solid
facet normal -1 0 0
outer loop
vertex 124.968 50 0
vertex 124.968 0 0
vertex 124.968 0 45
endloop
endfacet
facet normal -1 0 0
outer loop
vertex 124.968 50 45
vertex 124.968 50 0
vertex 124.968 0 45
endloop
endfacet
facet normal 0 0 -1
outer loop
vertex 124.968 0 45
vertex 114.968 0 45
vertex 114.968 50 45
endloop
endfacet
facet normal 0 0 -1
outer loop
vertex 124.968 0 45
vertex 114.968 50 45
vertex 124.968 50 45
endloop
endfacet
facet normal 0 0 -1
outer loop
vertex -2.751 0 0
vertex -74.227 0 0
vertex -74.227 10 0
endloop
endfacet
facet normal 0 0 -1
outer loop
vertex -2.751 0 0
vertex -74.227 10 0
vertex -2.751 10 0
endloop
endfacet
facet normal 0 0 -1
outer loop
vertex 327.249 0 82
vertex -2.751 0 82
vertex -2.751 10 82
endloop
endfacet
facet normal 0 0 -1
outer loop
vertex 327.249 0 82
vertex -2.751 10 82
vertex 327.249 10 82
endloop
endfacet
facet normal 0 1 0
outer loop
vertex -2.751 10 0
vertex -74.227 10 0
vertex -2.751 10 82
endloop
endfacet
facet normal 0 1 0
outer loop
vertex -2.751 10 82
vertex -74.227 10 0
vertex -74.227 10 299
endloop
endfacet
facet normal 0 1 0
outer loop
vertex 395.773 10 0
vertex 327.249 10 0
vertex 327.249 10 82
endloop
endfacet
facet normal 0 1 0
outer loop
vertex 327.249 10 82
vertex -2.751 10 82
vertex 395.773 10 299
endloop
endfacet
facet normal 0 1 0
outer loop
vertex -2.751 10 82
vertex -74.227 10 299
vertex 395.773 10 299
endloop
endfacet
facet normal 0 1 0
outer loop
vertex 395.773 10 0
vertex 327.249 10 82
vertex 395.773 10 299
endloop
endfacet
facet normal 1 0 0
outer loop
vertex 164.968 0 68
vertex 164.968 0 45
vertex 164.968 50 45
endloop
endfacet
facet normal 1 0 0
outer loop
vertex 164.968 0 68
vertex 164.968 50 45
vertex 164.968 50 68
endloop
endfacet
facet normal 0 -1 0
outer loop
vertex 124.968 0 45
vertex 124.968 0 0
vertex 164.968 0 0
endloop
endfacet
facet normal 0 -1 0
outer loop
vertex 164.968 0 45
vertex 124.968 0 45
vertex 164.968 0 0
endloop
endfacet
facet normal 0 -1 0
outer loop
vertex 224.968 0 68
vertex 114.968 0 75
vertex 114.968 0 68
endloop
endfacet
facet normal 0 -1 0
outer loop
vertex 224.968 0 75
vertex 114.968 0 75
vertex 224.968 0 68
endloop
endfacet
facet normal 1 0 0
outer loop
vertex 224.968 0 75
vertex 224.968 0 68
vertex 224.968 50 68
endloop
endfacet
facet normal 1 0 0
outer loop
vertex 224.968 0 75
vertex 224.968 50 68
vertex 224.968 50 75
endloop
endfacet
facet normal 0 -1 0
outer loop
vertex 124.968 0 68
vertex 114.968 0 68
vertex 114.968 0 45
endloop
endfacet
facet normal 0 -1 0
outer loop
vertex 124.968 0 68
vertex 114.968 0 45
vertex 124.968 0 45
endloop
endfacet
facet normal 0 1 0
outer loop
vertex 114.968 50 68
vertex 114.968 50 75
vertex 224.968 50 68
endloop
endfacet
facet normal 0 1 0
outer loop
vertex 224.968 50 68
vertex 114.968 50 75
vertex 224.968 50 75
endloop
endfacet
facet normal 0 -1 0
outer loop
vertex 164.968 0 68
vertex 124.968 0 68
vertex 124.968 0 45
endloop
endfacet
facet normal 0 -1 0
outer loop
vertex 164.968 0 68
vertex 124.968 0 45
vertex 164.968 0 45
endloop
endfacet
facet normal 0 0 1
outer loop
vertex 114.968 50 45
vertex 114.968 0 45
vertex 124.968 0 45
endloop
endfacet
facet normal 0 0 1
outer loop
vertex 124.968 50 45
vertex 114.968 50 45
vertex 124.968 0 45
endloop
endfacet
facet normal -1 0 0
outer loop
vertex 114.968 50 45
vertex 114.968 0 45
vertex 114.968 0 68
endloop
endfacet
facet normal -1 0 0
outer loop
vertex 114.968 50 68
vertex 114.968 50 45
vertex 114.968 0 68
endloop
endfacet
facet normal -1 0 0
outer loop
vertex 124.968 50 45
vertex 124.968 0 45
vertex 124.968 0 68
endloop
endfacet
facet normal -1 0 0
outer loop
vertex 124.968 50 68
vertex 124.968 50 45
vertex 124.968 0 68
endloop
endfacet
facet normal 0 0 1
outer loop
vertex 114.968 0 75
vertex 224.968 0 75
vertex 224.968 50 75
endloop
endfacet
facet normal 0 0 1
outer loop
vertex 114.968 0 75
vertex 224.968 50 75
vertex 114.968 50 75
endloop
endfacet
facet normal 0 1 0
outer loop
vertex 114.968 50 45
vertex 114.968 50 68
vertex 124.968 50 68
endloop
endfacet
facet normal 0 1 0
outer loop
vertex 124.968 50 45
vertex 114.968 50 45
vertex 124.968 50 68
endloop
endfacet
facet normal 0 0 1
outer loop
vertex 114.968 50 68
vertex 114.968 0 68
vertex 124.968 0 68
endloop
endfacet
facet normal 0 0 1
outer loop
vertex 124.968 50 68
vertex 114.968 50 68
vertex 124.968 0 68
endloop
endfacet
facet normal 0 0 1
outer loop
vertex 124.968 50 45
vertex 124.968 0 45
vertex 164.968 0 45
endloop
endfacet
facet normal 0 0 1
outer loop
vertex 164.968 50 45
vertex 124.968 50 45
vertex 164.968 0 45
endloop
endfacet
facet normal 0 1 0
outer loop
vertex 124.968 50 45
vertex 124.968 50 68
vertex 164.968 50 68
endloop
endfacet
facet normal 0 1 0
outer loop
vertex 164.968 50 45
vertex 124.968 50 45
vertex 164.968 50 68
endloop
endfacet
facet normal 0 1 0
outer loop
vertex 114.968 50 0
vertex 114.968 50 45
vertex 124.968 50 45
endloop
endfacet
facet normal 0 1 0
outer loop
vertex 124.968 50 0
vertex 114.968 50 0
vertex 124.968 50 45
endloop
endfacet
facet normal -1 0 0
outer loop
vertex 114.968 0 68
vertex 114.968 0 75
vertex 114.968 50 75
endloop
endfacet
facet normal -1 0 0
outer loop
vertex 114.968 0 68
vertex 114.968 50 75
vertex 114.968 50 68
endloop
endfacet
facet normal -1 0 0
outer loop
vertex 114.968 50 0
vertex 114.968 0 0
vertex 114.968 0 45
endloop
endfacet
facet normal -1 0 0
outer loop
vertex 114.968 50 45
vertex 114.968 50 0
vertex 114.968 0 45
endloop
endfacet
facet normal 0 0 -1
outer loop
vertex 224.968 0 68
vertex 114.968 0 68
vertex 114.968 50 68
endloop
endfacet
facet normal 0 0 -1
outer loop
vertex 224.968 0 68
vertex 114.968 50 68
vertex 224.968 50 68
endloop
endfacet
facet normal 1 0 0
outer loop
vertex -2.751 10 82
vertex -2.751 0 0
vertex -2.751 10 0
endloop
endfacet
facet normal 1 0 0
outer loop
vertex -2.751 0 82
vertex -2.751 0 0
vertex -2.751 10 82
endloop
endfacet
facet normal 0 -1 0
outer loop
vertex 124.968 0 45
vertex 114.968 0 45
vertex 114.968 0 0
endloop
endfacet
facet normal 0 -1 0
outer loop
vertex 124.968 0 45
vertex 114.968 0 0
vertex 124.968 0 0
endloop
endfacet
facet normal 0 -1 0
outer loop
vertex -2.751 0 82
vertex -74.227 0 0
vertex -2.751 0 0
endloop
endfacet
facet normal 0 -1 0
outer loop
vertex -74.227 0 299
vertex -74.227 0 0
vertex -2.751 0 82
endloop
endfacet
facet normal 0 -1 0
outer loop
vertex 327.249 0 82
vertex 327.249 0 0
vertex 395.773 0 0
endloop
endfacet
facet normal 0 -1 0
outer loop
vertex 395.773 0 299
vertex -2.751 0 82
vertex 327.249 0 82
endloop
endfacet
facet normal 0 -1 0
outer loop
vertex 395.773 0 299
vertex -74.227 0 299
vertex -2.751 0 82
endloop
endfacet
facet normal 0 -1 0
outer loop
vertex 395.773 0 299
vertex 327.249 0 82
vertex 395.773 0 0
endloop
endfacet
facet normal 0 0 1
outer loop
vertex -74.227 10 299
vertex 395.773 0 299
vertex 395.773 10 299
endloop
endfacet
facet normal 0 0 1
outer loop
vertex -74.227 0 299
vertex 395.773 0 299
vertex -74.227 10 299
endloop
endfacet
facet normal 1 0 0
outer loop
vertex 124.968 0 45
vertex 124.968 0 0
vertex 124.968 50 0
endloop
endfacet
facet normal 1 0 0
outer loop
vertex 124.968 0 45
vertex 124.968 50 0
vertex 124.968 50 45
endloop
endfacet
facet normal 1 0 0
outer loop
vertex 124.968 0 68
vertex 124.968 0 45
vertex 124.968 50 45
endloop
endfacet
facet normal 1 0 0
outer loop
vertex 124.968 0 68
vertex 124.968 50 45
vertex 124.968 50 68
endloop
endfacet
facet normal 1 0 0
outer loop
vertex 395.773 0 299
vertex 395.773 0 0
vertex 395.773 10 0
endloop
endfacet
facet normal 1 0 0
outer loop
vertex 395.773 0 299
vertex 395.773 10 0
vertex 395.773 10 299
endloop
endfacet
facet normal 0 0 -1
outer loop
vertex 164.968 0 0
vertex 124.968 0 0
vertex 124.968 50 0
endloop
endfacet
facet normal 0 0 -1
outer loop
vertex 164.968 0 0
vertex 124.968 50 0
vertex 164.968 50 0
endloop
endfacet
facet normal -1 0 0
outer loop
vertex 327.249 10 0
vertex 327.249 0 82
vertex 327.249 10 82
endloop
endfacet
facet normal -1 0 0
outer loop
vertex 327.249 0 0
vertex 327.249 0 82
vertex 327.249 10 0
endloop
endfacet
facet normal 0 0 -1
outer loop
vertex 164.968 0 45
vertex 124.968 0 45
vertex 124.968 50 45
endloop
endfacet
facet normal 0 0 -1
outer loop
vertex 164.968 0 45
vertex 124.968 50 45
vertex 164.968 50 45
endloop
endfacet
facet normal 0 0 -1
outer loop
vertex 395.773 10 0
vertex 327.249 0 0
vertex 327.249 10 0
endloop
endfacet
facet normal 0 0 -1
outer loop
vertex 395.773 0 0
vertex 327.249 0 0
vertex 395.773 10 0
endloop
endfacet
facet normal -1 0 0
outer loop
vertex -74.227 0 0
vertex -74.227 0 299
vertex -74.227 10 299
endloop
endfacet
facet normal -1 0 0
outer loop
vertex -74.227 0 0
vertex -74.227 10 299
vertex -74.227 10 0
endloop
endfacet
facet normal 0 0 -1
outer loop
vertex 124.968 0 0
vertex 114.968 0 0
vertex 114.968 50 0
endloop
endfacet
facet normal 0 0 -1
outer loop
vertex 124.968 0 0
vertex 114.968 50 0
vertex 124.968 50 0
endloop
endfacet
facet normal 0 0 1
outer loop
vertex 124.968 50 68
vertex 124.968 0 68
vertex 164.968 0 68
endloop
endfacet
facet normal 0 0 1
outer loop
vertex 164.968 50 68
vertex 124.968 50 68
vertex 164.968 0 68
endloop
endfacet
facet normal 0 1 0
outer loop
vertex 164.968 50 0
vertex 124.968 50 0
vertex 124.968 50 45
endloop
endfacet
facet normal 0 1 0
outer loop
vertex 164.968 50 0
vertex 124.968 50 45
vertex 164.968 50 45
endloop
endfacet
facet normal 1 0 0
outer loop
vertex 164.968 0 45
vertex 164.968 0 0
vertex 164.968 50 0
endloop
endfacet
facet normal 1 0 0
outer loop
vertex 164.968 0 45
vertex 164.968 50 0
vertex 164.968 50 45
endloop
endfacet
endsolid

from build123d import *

# Parameters (mm, degrees)
F2_DEPTH = 10
F0_W     = 40
F0_H     = 45
F3_DEPTH = 50
F4_DEPTH = 50
F0_W_2   = 10
F5_DEPTH = 50
F0_H_2   = 23
F6_DEPTH = 50
F7_DEPTH = 50


with BuildPart() as f2:
    # F0 (on Front) → F2 (new body)
    with BuildSketch(Plane.XZ):
        Polygon((-74.2268053811, 299), (-74.2268053811, 0), (-2.7509614592, 0), (-2.7509614592, 82), (327.2490385408, 82), (327.2490385408, 0), (395.7731946189, 0), (395.7731946189, 299), align=None)
    extrude(amount=-F2_DEPTH)


with BuildPart() as f3:
    # F0 (on Front) → F3 (new body)
    with BuildSketch(Plane.XZ):
        with Locations((144.9680732191, 22.5)):
            Rectangle(F0_W, F0_H)
    extrude(amount=-F3_DEPTH)


with BuildPart() as f4:
    # F0 (on Front) → F4 (new body)
    with BuildSketch(Plane.XZ):
        Polygon((114.9680732191, 75), (114.9680732191, 68), (124.9680732191, 68), (164.9680732191, 68), (224.9680732191, 68), (224.9680732191, 75), align=None)
    extrude(amount=-F4_DEPTH)


with BuildPart() as f5:
    # F0 (on Front) → F5 (new body)
    with BuildSketch(Plane.XZ):
        with Locations((119.9680732191, 22.5)):
            Rectangle(F0_W_2, F0_H)
    extrude(amount=-F5_DEPTH)


with BuildPart() as f6:
    # F0 (on Front) → F6 (new body)
    with BuildSketch(Plane.XZ):
        with Locations((144.9680732191, 56.5)):
            Rectangle(F0_W, F0_H_2)
    extrude(amount=-F6_DEPTH)


with BuildPart() as f7:
    # F0 (on Front) → F7 (new body)
    with BuildSketch(Plane.XZ):
        with Locations((119.9680732191, 56.5)):
            Rectangle(F0_W_2, F0_H_2)
    extrude(amount=-F7_DEPTH)


solid = Compound([f2.part, f3.part, f4.part, f5.part, f6.part, f7.part])
